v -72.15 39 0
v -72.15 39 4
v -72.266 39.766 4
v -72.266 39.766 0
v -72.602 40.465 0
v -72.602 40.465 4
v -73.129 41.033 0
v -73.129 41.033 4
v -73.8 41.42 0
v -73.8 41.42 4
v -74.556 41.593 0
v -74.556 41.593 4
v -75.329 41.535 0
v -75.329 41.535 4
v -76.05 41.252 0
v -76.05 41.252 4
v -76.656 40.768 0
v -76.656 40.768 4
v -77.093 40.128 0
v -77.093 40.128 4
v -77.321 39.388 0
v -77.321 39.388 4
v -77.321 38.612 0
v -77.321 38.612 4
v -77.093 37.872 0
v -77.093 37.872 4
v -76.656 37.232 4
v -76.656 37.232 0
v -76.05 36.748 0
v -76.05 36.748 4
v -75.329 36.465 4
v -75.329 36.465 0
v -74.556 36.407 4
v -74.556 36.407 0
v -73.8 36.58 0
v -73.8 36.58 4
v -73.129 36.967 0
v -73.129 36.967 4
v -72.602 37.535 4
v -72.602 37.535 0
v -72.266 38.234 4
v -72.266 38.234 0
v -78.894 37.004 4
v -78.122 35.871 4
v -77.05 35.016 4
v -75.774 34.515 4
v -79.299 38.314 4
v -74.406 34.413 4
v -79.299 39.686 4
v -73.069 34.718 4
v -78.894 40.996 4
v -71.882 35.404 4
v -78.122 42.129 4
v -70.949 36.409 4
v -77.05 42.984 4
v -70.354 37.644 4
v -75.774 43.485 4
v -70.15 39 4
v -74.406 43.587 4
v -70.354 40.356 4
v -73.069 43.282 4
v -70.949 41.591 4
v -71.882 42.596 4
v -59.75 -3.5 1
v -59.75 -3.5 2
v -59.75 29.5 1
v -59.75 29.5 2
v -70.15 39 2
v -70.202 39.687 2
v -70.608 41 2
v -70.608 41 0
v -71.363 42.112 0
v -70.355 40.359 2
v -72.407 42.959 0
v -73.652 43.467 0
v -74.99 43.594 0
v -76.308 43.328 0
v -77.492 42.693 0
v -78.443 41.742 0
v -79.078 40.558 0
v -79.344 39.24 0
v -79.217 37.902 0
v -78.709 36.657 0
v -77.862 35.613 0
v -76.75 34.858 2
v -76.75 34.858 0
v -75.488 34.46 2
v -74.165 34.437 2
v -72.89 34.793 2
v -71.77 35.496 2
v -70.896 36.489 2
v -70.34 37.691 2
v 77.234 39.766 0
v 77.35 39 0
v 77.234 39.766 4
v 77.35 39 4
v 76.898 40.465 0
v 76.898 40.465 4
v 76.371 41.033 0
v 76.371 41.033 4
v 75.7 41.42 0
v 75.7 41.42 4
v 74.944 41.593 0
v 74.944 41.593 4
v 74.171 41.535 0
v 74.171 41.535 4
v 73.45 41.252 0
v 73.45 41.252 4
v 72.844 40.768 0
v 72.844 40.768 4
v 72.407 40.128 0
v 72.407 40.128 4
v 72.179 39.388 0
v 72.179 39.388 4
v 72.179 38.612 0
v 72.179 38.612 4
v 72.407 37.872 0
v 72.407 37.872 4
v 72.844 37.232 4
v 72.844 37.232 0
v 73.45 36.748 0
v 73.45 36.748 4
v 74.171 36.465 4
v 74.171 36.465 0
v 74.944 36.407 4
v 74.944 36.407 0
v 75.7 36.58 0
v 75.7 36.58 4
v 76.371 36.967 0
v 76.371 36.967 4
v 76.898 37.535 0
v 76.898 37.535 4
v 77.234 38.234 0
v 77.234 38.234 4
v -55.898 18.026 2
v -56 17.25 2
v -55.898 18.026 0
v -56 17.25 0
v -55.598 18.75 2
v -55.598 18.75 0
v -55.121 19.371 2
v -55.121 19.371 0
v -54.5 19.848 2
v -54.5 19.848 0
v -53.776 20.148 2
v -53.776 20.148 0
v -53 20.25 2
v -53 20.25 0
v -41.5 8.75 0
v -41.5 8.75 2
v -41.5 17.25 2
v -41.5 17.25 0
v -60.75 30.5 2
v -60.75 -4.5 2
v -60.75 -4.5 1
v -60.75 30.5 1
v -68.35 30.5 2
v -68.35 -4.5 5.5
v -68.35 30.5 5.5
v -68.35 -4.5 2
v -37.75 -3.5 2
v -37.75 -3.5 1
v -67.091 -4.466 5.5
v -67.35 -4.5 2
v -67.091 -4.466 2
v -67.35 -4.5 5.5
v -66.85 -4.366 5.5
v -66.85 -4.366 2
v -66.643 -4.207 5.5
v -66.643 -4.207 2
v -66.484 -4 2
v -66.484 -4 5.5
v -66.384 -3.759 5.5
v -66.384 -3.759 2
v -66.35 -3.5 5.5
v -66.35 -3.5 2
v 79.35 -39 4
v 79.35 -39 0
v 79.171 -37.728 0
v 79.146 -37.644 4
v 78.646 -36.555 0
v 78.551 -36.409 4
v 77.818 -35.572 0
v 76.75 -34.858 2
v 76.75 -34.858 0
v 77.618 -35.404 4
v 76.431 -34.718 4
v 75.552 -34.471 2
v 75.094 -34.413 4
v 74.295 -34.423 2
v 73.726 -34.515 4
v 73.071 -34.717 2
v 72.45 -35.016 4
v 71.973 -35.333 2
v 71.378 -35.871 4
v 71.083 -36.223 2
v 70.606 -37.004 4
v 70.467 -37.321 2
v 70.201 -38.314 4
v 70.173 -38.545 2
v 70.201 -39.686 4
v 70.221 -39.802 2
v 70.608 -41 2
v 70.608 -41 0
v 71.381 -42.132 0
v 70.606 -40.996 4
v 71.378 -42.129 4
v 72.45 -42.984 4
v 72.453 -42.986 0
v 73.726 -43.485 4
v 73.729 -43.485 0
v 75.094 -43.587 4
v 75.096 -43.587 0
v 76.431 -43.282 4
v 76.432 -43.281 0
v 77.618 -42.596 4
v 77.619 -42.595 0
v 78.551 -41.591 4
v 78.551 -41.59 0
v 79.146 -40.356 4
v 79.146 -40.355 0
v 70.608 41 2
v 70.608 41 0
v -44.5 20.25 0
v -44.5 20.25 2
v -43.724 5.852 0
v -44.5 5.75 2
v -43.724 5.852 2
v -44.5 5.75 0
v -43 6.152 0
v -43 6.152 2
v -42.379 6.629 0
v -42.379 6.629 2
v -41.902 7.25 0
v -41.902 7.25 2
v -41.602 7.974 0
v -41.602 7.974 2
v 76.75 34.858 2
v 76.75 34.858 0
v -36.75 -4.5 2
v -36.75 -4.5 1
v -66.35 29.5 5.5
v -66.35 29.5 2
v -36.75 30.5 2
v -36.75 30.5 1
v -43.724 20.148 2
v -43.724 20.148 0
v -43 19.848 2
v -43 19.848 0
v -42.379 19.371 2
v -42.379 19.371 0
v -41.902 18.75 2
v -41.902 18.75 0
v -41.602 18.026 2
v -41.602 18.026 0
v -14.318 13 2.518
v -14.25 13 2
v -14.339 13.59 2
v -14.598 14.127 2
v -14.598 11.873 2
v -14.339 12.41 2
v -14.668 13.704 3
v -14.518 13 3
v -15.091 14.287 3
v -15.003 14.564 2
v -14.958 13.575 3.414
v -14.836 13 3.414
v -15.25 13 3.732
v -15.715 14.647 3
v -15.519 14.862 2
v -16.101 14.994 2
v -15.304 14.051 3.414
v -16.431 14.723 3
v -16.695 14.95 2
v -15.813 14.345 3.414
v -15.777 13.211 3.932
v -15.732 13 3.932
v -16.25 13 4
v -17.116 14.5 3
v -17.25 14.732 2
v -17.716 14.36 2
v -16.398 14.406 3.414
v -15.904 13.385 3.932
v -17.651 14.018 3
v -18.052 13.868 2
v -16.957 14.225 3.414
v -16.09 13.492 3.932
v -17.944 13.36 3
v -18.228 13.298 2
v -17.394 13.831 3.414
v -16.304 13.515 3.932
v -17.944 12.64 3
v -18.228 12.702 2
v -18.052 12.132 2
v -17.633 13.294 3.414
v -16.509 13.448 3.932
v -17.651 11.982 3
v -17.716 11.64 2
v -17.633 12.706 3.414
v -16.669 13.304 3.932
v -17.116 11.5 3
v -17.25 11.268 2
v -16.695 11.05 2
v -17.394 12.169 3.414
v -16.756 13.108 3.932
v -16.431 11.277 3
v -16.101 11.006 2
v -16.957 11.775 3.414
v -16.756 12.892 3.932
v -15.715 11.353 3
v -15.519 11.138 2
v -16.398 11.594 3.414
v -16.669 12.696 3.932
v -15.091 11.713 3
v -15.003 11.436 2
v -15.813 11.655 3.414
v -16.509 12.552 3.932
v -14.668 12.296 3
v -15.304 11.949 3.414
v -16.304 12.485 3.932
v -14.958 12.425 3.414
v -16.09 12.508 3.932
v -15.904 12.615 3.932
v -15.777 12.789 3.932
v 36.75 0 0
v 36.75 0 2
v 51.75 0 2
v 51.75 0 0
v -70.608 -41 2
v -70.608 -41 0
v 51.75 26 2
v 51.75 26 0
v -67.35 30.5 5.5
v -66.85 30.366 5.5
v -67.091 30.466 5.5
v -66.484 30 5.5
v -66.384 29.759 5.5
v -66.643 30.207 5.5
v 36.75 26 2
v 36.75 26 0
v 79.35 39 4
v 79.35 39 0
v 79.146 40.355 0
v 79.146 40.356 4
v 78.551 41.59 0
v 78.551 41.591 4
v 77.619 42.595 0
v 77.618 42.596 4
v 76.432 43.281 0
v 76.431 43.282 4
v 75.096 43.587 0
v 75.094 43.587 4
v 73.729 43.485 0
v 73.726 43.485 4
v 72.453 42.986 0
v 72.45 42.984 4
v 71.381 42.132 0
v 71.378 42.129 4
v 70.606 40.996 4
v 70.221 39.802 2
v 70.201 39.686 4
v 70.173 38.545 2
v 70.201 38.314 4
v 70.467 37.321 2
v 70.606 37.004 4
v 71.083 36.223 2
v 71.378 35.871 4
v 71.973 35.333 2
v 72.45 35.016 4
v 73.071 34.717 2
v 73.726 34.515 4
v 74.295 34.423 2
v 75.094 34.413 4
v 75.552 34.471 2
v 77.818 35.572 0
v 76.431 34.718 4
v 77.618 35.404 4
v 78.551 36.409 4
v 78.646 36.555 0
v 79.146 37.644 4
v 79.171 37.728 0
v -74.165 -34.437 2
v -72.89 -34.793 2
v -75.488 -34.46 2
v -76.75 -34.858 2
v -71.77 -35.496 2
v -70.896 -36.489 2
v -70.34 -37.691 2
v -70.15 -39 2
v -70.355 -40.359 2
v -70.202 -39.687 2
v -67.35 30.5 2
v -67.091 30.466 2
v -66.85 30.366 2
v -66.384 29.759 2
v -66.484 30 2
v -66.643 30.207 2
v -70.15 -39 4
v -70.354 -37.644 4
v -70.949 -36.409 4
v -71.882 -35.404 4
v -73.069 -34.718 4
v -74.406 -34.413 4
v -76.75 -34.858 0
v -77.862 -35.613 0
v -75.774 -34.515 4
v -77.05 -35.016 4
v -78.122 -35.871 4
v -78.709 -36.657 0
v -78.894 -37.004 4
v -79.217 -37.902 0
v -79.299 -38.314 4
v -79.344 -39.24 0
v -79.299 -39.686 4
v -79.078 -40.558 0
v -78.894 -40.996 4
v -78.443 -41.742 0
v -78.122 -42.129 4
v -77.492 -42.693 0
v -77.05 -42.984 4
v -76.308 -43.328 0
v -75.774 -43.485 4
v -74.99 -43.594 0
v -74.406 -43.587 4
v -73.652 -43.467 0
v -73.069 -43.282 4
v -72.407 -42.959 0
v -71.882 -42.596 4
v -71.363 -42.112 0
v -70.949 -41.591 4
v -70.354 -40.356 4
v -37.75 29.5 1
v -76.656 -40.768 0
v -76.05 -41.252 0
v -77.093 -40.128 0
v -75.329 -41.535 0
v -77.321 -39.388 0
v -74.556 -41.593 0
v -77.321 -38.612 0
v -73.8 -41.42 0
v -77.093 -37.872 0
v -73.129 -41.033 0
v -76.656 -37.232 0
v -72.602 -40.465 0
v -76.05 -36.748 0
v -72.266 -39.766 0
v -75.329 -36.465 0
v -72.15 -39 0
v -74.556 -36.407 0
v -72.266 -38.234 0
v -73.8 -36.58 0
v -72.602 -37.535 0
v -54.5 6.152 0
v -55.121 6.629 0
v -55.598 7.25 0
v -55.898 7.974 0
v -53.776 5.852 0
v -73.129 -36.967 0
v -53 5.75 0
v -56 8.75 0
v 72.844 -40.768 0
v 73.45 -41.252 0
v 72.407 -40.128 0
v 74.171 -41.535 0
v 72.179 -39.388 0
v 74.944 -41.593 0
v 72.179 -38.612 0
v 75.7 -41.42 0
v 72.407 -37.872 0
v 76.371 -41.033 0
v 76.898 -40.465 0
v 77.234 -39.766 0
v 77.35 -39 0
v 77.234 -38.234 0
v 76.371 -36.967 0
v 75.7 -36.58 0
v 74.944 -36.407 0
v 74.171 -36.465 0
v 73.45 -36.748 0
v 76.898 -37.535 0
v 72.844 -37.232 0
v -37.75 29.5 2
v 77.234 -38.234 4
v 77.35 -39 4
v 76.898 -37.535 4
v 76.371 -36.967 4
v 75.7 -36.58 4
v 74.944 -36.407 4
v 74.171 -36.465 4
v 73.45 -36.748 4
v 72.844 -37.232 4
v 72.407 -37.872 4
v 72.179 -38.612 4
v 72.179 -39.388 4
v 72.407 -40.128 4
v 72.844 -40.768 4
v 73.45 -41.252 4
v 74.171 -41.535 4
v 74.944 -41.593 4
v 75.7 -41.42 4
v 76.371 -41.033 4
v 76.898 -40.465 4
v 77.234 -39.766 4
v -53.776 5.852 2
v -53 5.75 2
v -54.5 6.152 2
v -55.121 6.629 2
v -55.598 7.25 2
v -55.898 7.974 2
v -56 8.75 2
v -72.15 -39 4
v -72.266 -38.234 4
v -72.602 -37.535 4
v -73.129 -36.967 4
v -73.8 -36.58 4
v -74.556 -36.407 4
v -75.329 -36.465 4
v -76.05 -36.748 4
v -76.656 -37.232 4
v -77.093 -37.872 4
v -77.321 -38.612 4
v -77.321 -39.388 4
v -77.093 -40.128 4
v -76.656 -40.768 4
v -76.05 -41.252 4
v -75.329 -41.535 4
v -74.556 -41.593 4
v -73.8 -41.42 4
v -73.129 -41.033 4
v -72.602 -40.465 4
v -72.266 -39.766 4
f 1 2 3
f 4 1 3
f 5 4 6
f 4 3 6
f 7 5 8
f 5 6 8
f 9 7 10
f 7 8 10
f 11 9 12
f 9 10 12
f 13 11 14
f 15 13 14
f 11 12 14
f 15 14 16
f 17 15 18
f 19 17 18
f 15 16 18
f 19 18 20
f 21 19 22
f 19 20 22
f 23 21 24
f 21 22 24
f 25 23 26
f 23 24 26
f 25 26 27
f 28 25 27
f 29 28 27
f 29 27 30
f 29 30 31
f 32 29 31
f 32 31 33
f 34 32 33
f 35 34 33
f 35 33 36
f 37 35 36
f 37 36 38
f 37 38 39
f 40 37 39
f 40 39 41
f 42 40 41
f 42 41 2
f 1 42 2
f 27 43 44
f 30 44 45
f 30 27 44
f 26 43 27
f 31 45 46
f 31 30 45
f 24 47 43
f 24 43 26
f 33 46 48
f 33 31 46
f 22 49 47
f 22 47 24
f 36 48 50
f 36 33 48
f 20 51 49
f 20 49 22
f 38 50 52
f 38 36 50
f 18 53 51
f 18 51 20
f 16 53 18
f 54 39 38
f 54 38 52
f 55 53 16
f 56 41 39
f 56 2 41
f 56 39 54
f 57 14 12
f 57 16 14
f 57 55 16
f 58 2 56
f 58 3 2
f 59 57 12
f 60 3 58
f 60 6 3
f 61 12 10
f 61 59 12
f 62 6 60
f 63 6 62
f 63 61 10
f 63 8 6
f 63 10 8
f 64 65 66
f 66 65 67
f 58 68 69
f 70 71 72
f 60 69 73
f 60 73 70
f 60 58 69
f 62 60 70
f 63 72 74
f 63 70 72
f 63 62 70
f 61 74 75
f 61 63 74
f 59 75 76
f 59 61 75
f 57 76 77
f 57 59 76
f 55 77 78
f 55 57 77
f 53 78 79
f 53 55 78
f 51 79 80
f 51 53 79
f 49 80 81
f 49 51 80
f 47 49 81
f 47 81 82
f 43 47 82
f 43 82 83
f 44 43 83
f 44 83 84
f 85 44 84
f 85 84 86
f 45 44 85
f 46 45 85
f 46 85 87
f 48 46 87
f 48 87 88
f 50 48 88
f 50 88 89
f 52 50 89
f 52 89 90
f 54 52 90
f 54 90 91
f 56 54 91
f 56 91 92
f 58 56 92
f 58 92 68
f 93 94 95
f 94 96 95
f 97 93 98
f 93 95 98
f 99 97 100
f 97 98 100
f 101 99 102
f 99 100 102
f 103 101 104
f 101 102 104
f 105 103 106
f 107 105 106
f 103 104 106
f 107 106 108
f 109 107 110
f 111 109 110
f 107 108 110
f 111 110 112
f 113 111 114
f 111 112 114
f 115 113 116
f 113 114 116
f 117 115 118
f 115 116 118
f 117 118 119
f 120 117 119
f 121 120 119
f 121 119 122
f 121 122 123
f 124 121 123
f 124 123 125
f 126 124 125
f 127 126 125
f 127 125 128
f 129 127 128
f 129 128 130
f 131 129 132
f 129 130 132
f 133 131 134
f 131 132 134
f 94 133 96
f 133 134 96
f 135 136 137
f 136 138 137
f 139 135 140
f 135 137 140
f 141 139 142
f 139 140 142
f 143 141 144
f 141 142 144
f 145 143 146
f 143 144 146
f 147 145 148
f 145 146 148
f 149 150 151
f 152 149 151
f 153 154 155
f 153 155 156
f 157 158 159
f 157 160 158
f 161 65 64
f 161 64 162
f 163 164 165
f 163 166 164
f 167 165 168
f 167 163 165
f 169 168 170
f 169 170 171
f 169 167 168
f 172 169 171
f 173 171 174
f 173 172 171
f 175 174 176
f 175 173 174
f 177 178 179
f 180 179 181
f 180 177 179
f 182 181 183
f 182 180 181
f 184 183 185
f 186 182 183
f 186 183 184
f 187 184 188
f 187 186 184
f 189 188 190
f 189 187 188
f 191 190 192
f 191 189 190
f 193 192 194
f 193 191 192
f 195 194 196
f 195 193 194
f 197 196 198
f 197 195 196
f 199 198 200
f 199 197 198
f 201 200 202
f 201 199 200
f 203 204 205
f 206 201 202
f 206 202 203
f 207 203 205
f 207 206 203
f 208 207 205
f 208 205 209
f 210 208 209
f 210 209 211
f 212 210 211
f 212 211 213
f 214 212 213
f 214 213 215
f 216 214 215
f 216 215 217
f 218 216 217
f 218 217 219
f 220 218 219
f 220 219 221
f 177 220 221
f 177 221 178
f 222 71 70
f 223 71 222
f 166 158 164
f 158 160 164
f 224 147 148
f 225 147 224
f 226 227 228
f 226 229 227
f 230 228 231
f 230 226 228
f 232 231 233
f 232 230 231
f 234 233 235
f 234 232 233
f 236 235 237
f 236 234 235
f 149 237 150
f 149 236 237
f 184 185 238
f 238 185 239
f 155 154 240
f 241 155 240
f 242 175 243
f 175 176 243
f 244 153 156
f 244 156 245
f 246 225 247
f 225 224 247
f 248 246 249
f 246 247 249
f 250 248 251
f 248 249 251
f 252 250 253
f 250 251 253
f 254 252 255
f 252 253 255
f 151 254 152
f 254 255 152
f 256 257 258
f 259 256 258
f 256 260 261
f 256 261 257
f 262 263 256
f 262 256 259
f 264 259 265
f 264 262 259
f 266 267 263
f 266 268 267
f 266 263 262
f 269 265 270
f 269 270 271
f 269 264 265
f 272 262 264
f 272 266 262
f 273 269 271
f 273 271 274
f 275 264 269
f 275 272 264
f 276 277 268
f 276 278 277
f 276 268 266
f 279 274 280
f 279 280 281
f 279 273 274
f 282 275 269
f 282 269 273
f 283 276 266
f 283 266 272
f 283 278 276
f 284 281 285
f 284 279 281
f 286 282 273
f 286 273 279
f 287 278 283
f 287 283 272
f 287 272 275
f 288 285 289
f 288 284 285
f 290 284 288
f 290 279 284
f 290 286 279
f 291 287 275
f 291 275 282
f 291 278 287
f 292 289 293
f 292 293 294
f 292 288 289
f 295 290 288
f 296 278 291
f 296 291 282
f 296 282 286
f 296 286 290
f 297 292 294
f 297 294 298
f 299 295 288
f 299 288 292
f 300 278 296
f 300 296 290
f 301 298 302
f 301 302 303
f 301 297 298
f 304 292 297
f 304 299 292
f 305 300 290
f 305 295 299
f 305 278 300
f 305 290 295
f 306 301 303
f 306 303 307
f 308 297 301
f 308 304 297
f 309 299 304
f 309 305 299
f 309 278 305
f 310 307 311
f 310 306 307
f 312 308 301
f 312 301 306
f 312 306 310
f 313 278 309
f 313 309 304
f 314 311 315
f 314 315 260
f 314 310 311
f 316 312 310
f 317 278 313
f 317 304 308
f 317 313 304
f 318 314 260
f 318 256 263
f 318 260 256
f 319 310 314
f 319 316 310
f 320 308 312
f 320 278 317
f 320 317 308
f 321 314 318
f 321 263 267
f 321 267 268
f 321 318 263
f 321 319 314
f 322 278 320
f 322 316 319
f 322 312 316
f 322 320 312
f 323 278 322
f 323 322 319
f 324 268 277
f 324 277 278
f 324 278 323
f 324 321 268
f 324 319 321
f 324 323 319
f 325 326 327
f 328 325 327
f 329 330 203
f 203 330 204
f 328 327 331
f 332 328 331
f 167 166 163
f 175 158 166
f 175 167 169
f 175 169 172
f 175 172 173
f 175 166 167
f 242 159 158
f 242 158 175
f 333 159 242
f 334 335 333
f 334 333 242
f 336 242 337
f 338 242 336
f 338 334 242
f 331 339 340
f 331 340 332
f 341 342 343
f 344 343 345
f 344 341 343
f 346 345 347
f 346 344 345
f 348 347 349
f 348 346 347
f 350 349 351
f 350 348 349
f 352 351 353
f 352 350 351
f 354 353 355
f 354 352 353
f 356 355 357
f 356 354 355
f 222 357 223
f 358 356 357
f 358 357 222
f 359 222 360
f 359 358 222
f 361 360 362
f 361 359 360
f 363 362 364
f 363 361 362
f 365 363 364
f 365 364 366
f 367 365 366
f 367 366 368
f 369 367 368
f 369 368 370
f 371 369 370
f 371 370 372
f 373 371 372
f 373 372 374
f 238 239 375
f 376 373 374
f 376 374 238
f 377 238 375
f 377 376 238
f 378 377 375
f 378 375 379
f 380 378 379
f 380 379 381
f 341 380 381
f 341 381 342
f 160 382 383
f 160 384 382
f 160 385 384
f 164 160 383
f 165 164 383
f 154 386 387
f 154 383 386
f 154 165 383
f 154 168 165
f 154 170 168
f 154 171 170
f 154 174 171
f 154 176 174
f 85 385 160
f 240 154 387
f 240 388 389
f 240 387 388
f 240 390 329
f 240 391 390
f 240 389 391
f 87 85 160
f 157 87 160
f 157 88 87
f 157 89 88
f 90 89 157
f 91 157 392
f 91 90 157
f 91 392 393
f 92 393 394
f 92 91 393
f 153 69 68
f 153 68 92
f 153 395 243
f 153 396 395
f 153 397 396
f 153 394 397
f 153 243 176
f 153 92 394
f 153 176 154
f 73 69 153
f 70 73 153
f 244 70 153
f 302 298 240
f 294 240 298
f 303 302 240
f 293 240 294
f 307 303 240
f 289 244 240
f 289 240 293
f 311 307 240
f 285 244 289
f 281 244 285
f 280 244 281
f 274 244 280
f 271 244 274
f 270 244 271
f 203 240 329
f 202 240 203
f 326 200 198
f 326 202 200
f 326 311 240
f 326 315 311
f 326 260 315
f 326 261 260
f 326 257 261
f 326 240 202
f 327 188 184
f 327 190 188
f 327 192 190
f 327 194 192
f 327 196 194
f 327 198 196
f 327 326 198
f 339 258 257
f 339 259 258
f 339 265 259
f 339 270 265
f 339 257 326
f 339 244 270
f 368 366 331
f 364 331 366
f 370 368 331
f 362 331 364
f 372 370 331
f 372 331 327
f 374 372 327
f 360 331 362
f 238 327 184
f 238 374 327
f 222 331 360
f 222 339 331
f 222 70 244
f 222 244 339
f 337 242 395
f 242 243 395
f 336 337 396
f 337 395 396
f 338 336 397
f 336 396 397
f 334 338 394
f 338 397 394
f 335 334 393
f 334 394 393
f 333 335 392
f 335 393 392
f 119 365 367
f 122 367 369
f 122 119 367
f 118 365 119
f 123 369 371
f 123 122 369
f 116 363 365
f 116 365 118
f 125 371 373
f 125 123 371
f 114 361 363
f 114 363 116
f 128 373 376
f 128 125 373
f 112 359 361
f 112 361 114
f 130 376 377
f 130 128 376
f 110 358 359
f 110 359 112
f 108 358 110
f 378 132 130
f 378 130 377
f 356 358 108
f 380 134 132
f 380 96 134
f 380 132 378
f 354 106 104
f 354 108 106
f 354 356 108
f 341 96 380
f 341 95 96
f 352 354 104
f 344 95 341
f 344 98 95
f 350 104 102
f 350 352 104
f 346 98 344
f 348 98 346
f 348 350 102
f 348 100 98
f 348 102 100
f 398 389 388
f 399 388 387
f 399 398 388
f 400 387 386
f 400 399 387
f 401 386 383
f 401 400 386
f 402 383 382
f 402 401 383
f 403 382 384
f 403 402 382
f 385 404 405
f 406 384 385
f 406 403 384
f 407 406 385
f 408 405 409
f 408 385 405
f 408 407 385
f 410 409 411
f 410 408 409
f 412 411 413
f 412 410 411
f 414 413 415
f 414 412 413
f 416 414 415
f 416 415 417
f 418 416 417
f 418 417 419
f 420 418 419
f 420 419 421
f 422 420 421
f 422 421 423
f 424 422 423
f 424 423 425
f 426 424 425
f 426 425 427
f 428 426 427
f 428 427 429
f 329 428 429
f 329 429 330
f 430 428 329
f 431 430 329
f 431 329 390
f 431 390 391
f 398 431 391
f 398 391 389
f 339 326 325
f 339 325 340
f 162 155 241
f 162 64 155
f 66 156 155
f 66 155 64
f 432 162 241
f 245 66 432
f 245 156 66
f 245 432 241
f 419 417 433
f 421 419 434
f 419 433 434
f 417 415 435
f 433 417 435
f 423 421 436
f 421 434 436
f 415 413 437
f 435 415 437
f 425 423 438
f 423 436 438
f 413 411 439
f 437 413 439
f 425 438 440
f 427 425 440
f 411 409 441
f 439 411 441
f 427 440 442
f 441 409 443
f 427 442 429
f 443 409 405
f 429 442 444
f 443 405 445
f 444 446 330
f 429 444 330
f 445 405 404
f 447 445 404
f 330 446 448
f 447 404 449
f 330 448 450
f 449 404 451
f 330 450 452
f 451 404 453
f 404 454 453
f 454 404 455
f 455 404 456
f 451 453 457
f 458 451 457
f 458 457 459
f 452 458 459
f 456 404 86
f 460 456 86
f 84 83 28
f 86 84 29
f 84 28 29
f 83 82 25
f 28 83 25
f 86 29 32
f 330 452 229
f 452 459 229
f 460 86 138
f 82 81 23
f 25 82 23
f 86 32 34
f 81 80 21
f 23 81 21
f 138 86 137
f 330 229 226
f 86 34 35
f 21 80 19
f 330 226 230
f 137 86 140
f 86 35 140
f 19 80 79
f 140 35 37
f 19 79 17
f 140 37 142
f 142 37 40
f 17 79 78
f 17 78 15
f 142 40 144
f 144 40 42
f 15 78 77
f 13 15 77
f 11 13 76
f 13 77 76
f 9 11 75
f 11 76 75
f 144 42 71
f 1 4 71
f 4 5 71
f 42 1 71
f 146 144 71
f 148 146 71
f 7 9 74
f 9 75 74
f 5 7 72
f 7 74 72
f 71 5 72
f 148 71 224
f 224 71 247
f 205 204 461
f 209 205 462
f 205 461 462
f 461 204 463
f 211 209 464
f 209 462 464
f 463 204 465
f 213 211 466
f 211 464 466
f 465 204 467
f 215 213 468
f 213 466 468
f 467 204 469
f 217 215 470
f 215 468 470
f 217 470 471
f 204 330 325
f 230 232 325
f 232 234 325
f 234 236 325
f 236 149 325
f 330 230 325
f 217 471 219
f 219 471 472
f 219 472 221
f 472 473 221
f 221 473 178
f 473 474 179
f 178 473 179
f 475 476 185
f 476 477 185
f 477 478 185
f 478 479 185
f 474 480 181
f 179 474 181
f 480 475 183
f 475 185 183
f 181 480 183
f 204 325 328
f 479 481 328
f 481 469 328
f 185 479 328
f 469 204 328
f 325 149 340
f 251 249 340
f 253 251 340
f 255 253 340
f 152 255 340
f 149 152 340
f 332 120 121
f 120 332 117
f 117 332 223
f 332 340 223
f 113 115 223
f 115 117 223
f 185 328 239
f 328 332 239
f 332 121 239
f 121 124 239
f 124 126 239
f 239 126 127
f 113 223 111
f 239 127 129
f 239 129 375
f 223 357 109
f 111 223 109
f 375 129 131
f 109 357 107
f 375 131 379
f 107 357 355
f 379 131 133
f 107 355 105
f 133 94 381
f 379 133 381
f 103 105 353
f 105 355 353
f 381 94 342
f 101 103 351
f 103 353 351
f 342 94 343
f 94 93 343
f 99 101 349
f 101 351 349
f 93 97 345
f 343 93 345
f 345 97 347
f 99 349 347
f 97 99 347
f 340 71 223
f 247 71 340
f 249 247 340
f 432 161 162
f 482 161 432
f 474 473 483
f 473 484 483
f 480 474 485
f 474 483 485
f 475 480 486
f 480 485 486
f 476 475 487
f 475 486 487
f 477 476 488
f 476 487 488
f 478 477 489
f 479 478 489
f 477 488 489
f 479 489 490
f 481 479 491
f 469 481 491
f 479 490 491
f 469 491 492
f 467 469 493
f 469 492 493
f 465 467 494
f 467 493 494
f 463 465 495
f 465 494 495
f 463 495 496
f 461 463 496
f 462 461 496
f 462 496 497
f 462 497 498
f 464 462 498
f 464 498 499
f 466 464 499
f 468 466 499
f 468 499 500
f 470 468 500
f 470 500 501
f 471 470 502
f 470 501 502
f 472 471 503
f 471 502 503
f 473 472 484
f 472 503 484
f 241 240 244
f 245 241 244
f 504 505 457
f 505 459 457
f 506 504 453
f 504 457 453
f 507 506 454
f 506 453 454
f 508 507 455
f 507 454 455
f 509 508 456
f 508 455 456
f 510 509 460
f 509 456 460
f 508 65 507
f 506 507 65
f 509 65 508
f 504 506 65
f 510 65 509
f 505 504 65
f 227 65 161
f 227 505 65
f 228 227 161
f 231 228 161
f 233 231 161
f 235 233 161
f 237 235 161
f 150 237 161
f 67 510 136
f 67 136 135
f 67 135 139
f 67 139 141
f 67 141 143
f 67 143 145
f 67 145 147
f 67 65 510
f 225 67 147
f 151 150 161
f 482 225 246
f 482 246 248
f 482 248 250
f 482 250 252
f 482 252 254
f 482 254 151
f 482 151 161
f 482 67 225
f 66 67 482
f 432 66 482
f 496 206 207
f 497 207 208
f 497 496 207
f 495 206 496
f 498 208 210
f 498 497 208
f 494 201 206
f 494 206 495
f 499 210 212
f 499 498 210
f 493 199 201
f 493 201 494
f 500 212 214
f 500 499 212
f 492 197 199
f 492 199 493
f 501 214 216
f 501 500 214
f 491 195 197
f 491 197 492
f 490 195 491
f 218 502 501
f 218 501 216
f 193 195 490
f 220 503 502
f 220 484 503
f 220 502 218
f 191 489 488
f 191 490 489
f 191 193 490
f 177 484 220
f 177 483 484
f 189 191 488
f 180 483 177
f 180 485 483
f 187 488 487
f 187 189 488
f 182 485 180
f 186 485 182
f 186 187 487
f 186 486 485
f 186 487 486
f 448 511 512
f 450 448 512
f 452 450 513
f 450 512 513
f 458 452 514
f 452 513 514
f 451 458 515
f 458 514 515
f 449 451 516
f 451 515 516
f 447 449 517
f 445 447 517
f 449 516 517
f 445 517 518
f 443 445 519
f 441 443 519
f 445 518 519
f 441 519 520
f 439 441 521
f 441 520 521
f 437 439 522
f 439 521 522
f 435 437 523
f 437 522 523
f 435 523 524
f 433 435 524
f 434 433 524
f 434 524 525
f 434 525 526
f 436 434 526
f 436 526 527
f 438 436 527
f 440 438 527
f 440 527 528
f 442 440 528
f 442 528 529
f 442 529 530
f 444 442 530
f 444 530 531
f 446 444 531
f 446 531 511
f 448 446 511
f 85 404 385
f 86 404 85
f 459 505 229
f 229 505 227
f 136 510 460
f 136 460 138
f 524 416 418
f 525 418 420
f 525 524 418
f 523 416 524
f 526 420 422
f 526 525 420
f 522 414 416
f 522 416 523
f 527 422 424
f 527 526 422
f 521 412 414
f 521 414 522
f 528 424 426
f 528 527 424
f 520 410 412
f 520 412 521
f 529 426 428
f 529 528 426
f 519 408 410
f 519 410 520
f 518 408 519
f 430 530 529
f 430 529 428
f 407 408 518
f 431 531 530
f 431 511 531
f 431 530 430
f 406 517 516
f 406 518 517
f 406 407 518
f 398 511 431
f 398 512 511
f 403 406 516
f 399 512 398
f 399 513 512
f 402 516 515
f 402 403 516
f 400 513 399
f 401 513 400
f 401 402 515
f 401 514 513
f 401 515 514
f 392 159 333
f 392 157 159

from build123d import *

# Parameters (mm, degrees)
F0_W           = 153.5
F0_H           = 82
F1_DEPTH       = 2
F2_W           = 15
F2_H           = 26
F2_W_2         = 14.5
F2_H_2         = 14.5
F3_DEPTH       = 2.001
F4_R           = 2
F5_DEPTH       = 2
F6_R           = 1.99999
F7_W           = 24
F7_H           = 35
F7_W_2         = 22
F7_H_2         = 33
F8_DEPTH       = 1
F10_R          = 4.6
F10_R_2        = 2.6
F11_DEPTH      = 4
F12_R          = 2.6
F13_DEPTH      = 4.001
F14_W          = 2
F14_H          = 35
F15_DEPTH      = 2
F15_DEPTH_BACK = 1.5
F16_R          = 1
F17_R          = 3


# Not quite as in the source:
# - a fillet or chamfer is up to 0.001 mm smaller than in the source, because OpenCascade refuses the exact size
# - a feature names something its author has since deleted; it is built from what else it names


with BuildPart() as f1:
    # F0 (on Top) → F1 (new body)
    with BuildSketch(Plane.XY):
        Rectangle(F0_W, F0_H)
    extrude(amount=F1_DEPTH)

    # F2 (on face) → F3 (cut, through all)
    with BuildSketch(Plane.XY.offset(2)):
        with Locations((44.25, 13)):
            Rectangle(F2_W, F2_H)
        with Locations((-48.75, 13)):
            Rectangle(F2_W_2, F2_H_2)
    extrude(amount=-F3_DEPTH, mode=Mode.SUBTRACT)

    # F4 (on face) → F5 (join)
    with BuildSketch(Plane.XY.offset(2)):
        with Locations((-16.25, 13)):
            Circle(F4_R)
    extrude(amount=F5_DEPTH)

    # F6 (radius 2 in the source; OpenCascade refuses exactly that, so slightly less here)
    f6_edges = [f1.edges().sort_by_distance(p)[0] for p in [
        (-18.25, 13, 4),
    ]]
    fillet(f6_edges, radius=F6_R)

    # F7 (on face) → F8 (cut)
    with BuildSketch(Plane.XY.offset(2)):
        with Locations((-48.75, 13)):
            Rectangle(F7_W, F7_H)
        with Locations((-48.75, 13)):
            Rectangle(F7_W_2, F7_H_2, mode=Mode.SUBTRACT)
    extrude(amount=-F8_DEPTH, mode=Mode.SUBTRACT)

    # F10 (on offset) → F11 (join)
    with BuildSketch(Plane.XY.offset(4)):
        with Locations((-74.75, 39)):
            Circle(F10_R)
        with Locations((-74.75, 39)):
            Circle(F10_R_2, mode=Mode.SUBTRACT)
        with Locations((74.75, 39)):
            Circle(F10_R)
        with Locations((74.75, 39)):
            Circle(F10_R_2, mode=Mode.SUBTRACT)
        with Locations((-74.75, -39)):
            Circle(F10_R)
        with Locations((-74.75, -39)):
            Circle(F10_R_2, mode=Mode.SUBTRACT)
        with Locations((74.75, -39)):
            Circle(F10_R)
        with Locations((74.75, -39)):
            Circle(F10_R_2, mode=Mode.SUBTRACT)
    extrude(amount=-F11_DEPTH)

    # F12 (on face) → F13 (cut, through all)
    with BuildSketch(Plane.XY.offset(4)):
        with Locations((-74.75, 39)):
            Circle(F12_R)
        with Locations((74.75, 39)):
            Circle(F12_R)
        with Locations((-74.75, -39)):
            Circle(F12_R)
        with Locations((74.75, -39)):
            Circle(F12_R)
    extrude(amount=-F13_DEPTH, mode=Mode.SUBTRACT)

    # F14 (on offset) → F15 (join, two sides)
    with BuildSketch(Plane.XY.offset(4)) as f15_sk:
        with Locations((-67.35, 13)):
            Rectangle(F14_W, F14_H)
    extrude(amount=-F15_DEPTH)
    extrude(f15_sk.sketch, amount=F15_DEPTH_BACK)

    # F16
    f16_edges = [f1.edges().sort_by_distance(p)[0] for p in [
        (-66.35, -4.5, 3.75),
        (-66.35, 30.5, 3.75),
    ]]
    fillet(f16_edges, radius=F16_R)

    # F17
    f17_edges = [f1.edges().sort_by_distance(p)[0] for p in [
        (-56, 20.25, 1),
        (-41.5, 5.75, 1),
        (-56, 5.75, 1),
        (-41.5, 20.25, 1),
    ]]
    fillet(f17_edges, radius=F17_R)


solid = f1.part
